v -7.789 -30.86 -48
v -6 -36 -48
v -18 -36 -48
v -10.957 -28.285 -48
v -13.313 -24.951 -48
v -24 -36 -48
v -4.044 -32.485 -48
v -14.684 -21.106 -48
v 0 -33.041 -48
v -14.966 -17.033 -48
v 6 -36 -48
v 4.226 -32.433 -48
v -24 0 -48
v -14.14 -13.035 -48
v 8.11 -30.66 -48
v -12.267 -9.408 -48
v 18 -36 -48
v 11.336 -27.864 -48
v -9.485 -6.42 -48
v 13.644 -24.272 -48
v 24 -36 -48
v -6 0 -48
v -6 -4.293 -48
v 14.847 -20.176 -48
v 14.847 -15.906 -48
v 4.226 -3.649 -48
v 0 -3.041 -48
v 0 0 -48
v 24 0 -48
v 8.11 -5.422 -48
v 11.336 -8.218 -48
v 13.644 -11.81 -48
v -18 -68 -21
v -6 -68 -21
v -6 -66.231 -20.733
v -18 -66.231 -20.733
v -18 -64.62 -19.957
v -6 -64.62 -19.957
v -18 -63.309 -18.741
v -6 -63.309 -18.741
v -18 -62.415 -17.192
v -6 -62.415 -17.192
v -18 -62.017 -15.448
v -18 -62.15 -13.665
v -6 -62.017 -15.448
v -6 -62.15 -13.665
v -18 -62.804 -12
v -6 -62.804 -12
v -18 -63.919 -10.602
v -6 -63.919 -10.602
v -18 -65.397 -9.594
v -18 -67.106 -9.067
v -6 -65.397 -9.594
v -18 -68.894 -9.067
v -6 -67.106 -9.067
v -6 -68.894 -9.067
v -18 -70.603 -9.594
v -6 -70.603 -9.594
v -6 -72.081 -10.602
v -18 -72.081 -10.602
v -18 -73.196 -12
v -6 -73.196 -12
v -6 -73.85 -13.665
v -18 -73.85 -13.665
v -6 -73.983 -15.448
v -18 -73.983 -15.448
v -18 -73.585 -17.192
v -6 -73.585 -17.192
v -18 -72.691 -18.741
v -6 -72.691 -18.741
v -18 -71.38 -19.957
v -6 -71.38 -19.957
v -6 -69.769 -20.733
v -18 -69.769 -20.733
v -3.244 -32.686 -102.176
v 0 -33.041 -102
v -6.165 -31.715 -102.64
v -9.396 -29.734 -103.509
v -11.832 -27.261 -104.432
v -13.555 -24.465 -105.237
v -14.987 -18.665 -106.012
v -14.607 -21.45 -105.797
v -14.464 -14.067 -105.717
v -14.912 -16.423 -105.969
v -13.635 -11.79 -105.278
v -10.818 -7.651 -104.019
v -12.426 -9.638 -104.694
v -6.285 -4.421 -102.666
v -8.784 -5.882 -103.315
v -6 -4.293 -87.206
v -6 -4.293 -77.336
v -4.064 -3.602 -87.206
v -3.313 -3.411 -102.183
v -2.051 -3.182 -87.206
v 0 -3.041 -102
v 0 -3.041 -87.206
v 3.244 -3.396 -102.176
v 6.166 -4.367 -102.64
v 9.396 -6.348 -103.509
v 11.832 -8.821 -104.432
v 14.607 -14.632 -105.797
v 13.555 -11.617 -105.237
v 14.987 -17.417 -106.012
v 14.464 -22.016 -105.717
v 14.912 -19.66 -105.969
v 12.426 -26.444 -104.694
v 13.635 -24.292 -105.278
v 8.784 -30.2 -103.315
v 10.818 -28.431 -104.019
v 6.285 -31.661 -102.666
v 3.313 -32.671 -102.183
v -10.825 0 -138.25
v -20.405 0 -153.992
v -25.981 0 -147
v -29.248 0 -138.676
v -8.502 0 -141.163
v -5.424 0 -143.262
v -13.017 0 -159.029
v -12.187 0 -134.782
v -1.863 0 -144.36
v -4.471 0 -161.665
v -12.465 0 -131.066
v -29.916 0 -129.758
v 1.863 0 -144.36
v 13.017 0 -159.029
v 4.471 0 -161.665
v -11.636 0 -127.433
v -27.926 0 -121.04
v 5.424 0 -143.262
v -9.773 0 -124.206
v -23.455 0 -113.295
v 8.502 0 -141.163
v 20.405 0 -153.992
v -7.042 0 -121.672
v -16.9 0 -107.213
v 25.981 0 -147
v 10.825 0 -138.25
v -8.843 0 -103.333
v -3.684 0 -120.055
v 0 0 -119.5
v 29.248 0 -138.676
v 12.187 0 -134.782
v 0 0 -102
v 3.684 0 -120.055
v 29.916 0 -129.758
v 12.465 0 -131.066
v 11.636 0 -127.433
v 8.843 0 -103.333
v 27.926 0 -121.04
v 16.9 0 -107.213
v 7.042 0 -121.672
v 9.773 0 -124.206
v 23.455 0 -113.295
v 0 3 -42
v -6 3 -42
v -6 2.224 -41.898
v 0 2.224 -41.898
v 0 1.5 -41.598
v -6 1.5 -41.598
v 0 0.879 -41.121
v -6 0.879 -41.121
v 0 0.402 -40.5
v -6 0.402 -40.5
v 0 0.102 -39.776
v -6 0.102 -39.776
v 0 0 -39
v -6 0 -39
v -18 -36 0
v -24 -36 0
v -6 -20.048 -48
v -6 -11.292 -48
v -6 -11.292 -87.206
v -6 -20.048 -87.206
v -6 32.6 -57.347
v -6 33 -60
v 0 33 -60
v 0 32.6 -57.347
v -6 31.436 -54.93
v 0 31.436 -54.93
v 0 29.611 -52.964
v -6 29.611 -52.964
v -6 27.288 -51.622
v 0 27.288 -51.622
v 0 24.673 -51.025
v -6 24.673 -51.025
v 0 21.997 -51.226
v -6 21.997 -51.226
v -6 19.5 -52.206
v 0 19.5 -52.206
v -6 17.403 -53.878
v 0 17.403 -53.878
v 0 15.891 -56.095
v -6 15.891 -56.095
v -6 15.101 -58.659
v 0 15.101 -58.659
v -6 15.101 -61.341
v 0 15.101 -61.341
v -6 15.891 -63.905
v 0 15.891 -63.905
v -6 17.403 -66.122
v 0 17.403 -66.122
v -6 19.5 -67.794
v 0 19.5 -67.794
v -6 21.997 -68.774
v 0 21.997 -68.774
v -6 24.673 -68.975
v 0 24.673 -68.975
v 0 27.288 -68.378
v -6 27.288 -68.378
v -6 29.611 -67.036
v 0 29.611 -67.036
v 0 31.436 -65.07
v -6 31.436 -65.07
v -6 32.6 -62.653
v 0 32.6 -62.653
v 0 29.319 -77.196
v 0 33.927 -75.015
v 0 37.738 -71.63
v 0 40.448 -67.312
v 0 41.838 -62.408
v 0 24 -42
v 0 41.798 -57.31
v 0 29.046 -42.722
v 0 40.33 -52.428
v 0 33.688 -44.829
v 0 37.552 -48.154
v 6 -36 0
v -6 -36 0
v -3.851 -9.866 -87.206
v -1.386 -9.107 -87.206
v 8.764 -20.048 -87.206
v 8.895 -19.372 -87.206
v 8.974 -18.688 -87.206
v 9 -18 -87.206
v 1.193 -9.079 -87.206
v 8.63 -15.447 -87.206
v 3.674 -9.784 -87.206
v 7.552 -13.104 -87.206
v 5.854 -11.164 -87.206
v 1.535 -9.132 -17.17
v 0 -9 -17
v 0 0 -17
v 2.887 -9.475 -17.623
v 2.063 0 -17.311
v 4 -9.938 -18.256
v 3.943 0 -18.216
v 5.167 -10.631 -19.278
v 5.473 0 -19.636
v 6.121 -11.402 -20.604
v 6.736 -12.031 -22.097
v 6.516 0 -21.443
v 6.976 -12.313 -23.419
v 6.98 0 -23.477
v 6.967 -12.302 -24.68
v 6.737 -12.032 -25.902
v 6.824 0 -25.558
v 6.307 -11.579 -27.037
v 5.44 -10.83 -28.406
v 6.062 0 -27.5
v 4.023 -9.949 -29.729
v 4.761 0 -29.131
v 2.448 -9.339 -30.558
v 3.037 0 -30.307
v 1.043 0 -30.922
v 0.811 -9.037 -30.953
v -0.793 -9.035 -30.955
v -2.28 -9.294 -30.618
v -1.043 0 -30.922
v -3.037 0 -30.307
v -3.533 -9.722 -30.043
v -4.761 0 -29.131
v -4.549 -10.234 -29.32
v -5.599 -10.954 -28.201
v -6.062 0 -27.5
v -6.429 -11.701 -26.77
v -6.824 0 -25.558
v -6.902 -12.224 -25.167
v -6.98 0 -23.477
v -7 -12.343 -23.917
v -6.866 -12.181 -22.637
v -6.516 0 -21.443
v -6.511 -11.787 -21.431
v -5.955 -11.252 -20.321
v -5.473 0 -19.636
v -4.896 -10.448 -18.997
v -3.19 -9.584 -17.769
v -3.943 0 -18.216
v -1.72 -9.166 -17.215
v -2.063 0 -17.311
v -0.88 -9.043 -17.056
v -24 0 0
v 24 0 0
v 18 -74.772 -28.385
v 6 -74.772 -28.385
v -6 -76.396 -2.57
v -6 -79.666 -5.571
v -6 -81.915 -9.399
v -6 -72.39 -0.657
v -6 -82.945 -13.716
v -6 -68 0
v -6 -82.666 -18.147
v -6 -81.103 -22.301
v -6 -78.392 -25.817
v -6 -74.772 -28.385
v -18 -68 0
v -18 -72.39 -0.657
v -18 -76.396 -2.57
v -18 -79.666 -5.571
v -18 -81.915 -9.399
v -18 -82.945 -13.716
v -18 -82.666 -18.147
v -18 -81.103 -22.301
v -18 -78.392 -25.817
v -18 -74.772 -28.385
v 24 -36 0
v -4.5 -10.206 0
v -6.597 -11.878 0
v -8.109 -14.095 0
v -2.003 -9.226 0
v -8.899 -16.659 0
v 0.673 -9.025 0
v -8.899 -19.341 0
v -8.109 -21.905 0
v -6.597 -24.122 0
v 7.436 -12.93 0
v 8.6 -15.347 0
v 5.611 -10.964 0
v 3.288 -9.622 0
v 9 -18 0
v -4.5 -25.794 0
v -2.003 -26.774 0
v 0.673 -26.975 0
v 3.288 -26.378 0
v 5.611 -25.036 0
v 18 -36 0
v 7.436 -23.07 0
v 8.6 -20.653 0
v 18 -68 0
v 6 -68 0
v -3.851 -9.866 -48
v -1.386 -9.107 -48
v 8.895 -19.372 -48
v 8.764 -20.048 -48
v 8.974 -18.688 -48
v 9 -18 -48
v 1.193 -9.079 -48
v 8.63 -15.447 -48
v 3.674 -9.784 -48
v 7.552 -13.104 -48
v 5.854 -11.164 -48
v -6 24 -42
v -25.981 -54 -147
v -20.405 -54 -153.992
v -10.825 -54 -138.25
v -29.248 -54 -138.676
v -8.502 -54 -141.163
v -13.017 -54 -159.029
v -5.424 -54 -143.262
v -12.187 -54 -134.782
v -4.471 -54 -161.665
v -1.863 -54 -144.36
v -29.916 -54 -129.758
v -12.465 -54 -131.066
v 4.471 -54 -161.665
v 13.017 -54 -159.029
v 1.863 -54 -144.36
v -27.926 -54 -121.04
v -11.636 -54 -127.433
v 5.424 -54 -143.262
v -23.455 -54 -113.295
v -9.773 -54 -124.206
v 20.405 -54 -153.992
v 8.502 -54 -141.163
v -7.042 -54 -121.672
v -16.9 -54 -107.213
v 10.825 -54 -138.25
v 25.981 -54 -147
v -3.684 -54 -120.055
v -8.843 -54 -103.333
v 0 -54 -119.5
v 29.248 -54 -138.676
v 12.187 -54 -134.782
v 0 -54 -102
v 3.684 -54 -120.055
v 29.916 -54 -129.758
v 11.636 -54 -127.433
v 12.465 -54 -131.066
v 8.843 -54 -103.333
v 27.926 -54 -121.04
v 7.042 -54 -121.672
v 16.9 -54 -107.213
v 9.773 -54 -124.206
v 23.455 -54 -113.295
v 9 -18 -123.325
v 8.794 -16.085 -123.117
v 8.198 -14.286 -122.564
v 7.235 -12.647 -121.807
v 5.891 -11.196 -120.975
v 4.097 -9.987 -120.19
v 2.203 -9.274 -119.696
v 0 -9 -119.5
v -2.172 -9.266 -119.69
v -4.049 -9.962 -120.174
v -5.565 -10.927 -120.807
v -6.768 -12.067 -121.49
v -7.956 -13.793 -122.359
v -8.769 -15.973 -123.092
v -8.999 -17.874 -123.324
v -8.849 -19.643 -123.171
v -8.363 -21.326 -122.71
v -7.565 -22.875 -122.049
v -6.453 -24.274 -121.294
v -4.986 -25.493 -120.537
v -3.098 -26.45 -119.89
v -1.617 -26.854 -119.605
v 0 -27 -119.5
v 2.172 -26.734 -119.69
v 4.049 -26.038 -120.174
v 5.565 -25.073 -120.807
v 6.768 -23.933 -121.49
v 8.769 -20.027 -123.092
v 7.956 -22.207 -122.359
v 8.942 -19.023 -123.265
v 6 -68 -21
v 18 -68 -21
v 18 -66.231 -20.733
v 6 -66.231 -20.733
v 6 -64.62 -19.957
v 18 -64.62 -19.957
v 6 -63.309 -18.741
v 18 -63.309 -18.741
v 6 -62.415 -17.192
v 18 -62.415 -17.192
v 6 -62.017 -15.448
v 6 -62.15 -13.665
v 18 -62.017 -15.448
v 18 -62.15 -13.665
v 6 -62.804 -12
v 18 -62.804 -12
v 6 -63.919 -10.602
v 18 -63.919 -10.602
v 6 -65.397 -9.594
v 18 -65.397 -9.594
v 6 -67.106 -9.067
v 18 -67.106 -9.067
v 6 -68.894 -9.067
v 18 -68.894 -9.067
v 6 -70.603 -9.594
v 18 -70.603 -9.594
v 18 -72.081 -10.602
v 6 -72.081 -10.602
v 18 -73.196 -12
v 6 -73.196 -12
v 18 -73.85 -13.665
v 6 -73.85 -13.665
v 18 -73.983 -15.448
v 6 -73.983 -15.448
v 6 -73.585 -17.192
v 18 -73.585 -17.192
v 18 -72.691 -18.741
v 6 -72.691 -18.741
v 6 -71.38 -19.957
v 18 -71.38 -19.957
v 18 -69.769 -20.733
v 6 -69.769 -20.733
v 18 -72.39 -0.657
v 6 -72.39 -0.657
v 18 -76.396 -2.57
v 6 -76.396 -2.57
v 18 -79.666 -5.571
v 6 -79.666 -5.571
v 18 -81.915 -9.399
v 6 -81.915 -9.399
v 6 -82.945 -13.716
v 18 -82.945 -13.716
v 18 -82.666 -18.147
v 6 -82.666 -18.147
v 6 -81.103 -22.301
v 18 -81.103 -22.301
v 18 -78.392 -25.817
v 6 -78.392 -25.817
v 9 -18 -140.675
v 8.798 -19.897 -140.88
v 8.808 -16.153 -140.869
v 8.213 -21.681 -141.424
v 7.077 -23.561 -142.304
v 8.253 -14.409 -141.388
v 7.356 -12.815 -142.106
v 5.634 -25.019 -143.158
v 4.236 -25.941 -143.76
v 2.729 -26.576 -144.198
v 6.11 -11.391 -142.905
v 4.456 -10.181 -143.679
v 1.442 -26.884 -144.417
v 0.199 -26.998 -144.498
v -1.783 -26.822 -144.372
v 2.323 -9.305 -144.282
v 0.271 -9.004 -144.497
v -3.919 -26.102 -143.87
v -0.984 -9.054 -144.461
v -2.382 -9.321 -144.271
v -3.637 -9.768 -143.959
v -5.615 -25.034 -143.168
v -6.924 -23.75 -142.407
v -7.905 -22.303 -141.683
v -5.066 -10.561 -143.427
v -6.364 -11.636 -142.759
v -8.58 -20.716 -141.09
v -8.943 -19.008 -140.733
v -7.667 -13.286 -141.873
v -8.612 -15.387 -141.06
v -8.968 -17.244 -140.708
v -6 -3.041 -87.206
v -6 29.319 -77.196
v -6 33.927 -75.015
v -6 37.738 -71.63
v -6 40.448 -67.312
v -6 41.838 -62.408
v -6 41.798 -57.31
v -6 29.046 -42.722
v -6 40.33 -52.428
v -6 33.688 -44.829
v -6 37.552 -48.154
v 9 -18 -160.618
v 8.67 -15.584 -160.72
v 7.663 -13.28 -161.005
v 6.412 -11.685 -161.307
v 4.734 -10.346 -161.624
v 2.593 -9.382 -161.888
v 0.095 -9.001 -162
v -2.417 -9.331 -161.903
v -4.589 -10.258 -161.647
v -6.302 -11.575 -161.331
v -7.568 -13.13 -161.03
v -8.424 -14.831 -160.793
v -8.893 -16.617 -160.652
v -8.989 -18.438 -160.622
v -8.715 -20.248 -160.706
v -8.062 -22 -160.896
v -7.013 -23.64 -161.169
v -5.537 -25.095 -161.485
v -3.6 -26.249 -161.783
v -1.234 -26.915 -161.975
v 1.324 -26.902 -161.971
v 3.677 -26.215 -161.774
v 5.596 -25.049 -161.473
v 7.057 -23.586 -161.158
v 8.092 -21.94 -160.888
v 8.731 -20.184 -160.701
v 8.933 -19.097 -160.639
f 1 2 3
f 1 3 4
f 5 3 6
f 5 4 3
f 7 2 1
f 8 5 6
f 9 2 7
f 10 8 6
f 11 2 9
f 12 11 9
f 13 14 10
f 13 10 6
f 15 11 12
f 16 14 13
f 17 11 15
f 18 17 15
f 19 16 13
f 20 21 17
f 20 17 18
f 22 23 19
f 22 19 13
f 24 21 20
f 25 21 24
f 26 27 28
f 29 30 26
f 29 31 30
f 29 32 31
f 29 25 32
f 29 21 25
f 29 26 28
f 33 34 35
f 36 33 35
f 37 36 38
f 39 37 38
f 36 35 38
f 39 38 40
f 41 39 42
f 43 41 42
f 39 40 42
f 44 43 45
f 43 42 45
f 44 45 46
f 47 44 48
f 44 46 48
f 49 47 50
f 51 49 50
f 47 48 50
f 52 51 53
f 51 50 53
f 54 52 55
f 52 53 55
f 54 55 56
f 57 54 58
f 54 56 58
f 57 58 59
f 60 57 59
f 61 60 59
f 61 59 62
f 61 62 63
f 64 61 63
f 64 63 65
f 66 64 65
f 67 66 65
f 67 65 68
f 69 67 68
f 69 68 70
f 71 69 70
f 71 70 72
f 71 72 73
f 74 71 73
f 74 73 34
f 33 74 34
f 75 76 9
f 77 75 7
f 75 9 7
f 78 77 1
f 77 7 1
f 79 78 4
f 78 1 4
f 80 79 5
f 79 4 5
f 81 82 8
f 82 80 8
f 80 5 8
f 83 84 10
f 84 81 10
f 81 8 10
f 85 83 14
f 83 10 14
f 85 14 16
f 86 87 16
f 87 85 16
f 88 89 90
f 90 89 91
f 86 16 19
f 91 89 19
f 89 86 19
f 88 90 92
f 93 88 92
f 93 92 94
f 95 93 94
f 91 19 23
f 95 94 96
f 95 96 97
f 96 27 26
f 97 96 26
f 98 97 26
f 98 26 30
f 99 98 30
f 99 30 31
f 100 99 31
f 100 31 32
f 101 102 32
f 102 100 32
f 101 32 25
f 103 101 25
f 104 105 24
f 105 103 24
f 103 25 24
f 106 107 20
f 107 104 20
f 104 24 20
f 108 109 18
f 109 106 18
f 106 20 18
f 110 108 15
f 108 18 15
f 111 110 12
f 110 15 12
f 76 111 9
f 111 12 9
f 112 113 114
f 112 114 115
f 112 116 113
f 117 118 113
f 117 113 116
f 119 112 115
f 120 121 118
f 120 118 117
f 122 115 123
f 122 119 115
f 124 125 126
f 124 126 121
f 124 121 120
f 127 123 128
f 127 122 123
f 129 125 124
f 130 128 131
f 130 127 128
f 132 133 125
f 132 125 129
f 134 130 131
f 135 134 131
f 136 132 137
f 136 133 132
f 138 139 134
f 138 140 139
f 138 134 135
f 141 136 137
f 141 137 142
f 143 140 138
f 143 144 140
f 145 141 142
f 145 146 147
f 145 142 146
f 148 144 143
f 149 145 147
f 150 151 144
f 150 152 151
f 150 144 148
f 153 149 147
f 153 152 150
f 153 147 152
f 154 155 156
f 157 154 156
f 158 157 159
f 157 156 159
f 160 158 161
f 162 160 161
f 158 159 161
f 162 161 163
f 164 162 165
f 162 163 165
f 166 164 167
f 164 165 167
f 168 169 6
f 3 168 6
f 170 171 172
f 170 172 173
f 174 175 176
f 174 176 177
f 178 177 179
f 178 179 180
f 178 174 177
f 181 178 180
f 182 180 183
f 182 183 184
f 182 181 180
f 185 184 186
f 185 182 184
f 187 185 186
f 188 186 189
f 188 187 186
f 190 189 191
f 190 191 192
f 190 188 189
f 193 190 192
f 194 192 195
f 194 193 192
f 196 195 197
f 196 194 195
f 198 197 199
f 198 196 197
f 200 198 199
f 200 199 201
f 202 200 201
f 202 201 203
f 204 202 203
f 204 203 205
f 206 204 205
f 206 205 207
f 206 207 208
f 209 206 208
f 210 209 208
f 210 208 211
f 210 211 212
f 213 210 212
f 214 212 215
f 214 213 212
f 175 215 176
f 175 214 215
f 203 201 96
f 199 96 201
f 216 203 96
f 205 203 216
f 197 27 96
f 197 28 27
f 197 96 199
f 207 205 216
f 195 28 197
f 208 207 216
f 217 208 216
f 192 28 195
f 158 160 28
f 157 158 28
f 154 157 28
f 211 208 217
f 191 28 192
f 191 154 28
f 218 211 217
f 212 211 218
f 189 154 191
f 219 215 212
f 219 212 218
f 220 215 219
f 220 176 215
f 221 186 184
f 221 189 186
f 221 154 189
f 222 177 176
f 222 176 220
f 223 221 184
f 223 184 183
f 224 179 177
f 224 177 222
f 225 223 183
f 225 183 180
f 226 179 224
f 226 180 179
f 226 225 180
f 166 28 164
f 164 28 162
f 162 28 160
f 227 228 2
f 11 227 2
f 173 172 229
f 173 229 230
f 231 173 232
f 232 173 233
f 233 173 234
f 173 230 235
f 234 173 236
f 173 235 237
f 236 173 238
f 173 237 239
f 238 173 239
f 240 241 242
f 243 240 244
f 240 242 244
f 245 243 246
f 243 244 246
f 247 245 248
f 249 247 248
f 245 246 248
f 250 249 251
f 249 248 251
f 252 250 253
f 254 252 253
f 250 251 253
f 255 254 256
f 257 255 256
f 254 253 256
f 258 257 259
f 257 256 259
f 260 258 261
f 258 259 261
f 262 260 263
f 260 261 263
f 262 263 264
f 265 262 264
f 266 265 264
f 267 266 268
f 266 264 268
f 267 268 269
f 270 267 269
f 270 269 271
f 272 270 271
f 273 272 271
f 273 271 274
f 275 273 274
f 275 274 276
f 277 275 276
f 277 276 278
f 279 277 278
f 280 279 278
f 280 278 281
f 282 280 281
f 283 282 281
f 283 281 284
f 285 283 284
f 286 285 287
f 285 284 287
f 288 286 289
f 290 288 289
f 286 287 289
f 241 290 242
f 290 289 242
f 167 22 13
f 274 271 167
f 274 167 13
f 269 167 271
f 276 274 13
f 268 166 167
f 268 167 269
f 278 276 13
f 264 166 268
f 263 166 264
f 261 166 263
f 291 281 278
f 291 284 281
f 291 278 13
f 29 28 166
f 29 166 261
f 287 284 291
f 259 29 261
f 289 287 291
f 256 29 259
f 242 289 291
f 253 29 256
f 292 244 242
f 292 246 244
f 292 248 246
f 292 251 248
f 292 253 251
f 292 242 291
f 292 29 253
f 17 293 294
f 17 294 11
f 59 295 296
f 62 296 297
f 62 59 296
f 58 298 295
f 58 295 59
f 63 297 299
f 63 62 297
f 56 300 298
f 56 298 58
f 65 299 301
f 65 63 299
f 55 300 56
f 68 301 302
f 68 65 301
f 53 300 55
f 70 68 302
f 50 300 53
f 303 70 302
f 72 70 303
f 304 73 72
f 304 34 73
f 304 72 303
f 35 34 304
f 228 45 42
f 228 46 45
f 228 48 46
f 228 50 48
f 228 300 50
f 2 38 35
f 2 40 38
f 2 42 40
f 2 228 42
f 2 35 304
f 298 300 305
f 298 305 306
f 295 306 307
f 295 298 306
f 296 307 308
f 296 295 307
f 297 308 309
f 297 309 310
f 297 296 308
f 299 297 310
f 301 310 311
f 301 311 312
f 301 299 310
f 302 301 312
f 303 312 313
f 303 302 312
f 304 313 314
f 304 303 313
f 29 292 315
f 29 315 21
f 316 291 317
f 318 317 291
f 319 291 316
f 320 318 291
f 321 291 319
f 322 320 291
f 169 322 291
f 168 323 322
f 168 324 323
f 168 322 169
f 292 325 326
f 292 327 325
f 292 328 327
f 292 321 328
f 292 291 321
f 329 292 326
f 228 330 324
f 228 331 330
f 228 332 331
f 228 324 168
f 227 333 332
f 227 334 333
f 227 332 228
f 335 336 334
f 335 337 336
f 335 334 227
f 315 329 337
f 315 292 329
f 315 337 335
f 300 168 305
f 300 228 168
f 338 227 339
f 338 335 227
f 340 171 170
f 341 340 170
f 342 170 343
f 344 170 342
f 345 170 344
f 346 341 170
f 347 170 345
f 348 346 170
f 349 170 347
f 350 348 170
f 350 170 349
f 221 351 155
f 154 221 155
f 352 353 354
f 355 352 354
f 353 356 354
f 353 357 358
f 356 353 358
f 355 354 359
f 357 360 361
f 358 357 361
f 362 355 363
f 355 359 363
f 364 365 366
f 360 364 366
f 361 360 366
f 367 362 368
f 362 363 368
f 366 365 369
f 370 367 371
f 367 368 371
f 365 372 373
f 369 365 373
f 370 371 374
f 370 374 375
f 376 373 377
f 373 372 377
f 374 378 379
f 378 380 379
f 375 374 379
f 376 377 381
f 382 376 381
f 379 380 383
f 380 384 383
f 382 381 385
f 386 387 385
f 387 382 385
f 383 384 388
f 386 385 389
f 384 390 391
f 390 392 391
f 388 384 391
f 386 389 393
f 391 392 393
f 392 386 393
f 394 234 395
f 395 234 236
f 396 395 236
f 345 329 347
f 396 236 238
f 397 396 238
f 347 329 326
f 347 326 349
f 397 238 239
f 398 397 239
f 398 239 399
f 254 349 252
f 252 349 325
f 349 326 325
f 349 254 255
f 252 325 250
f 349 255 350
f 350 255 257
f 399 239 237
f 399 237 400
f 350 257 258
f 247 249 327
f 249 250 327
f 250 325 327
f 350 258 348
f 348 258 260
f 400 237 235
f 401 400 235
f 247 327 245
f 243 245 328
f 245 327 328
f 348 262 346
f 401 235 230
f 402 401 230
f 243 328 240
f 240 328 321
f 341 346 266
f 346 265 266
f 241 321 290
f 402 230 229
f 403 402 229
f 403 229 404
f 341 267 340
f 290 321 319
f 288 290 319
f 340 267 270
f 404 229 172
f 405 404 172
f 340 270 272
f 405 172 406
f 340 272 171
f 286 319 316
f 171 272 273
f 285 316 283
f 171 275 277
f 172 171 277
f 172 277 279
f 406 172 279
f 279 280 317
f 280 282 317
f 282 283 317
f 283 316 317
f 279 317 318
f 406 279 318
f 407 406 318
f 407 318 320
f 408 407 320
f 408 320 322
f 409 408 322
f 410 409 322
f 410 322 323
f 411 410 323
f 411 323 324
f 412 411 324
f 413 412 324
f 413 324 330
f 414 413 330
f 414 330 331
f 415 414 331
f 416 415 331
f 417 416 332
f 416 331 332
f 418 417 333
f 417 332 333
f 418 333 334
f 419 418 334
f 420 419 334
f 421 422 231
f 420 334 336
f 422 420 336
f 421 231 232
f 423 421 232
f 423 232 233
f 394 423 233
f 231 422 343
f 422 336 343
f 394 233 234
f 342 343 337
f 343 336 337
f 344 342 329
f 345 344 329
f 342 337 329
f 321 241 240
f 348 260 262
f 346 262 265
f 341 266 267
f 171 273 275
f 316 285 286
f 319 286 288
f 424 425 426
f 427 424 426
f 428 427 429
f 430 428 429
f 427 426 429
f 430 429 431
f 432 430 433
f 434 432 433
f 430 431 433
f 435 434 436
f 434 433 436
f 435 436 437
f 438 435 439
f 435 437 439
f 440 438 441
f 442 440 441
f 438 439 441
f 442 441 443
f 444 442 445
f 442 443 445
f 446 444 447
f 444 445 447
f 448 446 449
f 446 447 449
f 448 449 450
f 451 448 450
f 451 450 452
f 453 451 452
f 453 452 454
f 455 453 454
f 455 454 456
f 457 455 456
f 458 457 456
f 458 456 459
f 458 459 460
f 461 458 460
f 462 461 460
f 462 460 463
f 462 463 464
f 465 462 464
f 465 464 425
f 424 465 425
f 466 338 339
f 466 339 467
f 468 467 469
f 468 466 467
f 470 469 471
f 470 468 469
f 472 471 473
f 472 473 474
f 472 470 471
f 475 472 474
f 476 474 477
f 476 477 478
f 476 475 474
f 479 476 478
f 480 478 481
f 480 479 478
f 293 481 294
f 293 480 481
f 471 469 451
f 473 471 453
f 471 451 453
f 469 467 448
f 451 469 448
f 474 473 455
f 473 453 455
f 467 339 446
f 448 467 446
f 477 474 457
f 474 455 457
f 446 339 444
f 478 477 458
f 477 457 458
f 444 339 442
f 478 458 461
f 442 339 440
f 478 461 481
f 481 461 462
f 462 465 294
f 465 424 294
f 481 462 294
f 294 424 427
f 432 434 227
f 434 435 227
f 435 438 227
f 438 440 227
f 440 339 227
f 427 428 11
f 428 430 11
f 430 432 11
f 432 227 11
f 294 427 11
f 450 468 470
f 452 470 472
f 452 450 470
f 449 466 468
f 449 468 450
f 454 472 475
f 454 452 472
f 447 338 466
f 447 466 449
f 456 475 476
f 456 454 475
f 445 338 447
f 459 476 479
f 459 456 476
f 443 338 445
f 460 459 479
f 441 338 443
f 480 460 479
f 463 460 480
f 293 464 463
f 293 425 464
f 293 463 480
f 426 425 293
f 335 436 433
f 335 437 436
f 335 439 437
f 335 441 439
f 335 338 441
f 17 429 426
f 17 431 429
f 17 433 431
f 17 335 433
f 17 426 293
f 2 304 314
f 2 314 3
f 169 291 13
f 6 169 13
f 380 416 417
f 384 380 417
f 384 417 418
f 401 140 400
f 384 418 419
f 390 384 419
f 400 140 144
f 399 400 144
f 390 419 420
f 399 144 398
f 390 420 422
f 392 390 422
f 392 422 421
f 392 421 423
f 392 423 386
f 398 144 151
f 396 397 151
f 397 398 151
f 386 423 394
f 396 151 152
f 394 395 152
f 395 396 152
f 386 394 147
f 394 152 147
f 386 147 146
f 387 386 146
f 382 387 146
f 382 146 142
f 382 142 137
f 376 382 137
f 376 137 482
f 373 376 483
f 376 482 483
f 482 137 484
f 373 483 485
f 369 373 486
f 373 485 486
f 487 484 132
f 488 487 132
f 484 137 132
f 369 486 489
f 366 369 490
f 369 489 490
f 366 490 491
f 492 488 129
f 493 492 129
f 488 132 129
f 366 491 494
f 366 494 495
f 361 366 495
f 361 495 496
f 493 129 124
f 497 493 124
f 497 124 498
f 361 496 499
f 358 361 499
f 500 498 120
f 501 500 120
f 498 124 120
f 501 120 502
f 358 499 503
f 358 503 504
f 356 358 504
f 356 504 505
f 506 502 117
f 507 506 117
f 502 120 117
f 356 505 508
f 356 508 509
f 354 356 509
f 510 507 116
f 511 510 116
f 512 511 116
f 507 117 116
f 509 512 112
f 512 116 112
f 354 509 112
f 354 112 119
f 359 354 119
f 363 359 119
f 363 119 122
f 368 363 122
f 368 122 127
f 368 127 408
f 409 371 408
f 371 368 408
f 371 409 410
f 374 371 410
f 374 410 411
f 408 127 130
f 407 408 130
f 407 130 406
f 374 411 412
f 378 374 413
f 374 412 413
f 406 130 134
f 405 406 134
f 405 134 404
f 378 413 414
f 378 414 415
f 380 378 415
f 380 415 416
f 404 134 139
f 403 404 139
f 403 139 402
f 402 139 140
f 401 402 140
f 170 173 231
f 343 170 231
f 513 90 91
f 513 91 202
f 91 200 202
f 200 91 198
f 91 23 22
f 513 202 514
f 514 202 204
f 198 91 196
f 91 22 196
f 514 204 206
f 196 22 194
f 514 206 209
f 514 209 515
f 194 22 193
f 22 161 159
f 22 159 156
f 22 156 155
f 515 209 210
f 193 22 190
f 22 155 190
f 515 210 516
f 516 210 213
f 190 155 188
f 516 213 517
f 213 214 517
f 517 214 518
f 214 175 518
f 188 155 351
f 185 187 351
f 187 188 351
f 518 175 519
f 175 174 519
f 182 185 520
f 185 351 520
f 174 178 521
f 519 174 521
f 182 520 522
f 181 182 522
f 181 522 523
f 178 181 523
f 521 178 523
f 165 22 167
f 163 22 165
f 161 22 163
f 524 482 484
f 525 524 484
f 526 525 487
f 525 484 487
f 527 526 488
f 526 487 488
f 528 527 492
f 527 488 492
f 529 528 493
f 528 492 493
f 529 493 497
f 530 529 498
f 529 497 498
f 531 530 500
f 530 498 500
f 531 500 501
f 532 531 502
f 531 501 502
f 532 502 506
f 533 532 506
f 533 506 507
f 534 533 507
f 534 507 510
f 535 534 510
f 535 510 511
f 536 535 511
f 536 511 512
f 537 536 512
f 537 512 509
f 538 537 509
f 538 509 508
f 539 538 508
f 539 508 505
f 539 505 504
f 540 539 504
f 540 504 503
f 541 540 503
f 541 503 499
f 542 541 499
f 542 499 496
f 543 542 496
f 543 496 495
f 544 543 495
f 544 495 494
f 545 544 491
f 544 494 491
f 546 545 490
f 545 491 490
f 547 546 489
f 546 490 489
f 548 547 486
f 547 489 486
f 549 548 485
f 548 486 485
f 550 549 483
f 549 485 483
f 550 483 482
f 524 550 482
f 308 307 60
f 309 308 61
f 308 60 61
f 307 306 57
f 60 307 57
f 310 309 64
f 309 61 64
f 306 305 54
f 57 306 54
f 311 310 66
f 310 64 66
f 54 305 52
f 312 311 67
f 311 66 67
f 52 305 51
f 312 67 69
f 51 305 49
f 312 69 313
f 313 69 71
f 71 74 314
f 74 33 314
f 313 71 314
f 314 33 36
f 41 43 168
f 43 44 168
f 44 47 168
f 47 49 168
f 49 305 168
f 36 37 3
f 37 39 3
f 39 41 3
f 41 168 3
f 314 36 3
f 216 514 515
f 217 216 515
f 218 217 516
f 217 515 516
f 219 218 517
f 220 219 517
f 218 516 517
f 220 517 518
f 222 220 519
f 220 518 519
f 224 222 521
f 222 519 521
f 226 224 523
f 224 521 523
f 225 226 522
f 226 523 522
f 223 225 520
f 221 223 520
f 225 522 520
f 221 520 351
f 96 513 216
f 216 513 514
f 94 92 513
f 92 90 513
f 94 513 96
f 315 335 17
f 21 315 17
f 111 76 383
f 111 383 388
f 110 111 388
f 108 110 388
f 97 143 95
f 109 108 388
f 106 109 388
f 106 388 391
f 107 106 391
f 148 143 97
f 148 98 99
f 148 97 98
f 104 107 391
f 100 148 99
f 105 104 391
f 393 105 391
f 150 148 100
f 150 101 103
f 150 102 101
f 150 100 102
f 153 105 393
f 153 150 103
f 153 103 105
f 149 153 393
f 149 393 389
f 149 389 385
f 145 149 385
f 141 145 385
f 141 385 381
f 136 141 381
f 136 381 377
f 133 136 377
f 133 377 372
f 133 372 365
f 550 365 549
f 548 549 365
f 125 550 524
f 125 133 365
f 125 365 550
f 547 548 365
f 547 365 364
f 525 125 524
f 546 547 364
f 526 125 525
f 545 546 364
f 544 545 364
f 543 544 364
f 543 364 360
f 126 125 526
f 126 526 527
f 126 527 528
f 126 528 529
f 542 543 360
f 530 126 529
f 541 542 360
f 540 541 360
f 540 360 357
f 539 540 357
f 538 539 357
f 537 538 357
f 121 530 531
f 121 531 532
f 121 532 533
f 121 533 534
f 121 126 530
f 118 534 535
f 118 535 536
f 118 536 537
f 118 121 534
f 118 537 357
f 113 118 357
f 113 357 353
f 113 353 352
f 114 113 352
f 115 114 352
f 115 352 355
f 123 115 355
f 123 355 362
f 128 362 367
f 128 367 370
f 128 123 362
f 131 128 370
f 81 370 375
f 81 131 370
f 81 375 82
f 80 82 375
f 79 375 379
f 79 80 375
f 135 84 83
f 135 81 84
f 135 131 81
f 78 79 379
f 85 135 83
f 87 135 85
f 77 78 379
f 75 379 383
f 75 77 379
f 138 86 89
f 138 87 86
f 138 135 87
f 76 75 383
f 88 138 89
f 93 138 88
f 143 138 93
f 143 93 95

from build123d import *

# Parameters (mm, degrees)
BOSS_EXTRUDE1_DEPTH       = 24
BOSS_EXTRUDE1_DEPTH_BACK  = 24
SKETCH1_W                 = 48
SKETCH1_H                 = 36
BOSS_EXTRUDE2_DEPTH       = 12
BOSS_EXTRUDE3_START       = -12
BOSS_EXTRUDE3_DEPTH       = 12
SKETCH7_R                 = 6
CUT_EXTRUDE1_DEPTH        = 105.675689632
SKETCH9_R                 = 30
SKETCH9_R_2               = 12.5
BOSS_EXTRUDE4_DEPTH       = 54
BOSS_EXTRUDE5_REACH       = 146.17
BOSS_EXTRUDE5_END_RADIUS  = 30
SKETCH10_R                = 15
SKETCH11_R                = 9
CUT_EXTRUDE2_DEPTH        = 185.480351361
BOSS_EXTRUDE6_START       = -87.205977382
BOSS_EXTRUDE6_DEPTH       = 39.205977382
BOSS_EXTRUDE6_START_2     = -77.335756752
BOSS_EXTRUDE6_2_DEPTH     = 29.335756752
BOSS_EXTRUDE6_START_3     = -6
BOSS_EXTRUDE6_3_OUTLINE_R = 9
BOSS_EXTRUDE6_3_DEPTH     = 6
CUT_EXTRUDE3_REACH        = 186.48
CUT_EXTRUDE3_END_RADIUS   = 9
SKETCH13_R                = 7


with BuildPart() as part:
    # Sketch1 → Boss-Extrude1 (new, two sides: drawn at the far end of the back side and taken through both)
    with BuildSketch(Plane(origin=(0, 0, 0), x_dir=(0, 0, -1), z_dir=(1, 0, 0)).offset(-BOSS_EXTRUDE1_DEPTH_BACK)):
        with Locations((24, -18)):
            Rectangle(SKETCH1_W, SKETCH1_H)
    extrude(amount=BOSS_EXTRUDE1_DEPTH + BOSS_EXTRUDE1_DEPTH_BACK)

    # Sketch2 → Boss-Extrude2 (add)
    with BuildSketch(Plane(origin=(18, 0, 0), x_dir=(0, 0, -1), z_dir=(1, 0, 0))):
        with BuildLine():
            Line((0, -36), (0, -68))
            ThreePointArc((0, -68), (11.519205494, -82.590547269), (28.384542614, -74.771559571))
            Line((28.384542614, -74.771559571), (48, -36))
            Line((48, -36), (0, -36))
        make_face()
    extrude(amount=-BOSS_EXTRUDE2_DEPTH)

    # Sketch6 → Boss-Extrude3 (add)
    with BuildSketch(Plane.ZY.offset(18).offset(BOSS_EXTRUDE3_START)):
        with BuildLine():
            Line((0, -36), (0, -68))
            ThreePointArc((0, -68), (-11.519205494, -82.590547269), (-28.384542614, -74.771559571))
            Line((-28.384542614, -74.771559571), (-48, -36))
            Line((-48, -36), (-48, 0))
            Line((-48, 0), (0, 0))
            Line((0, 0), (0, -36))
        make_face()
    extrude(amount=BOSS_EXTRUDE3_DEPTH)

    # Sketch7 → Cut-Extrude1 (cut, through all)
    with BuildSketch(Plane(origin=(18, 0, 0), x_dir=(0, 0, -1), z_dir=(1, 0, 0))):
        with Locations((15, -68)):
            Circle(SKETCH7_R)
    extrude(amount=-CUT_EXTRUDE1_DEPTH, mode=Mode.SUBTRACT)



with BuildPart() as body_2:
    # Sketch9 → Boss-Extrude4 (new body)
    with BuildSketch(Plane(origin=(0, 0, 0), x_dir=(1, 0, 0), z_dir=(0, 1, 0))):
        with Locations(Location((0, 132, 0), (0, 0, 270))):
            Circle(SKETCH9_R)
        with Locations(Location((0, 132, 0), (0, 0, 270))):
            Circle(SKETCH9_R_2, mode=Mode.SUBTRACT)
    extrude(amount=-BOSS_EXTRUDE4_DEPTH)


with BuildPart() as part_1:
    add(part.part)

    add(body_2.part)  # Boss-Extrude5 merges body 2
    # Boss-Extrude5: up to this cylinder (the profile starts outside it)
    boss_extrude5_end = Plane(origin=(0, -18.040976, -132), z_dir=(0, 1, 0)) * Cylinder(BOSS_EXTRUDE5_END_RADIUS, 353.34, mode=Mode.PRIVATE)
    # Sketch10 → Boss-Extrude5 (add, up to the surface)
    with BuildSketch(Plane(origin=(0, 0, -48), x_dir=(-1, 0, 0), z_dir=(0, 0, -1)), mode=Mode.PRIVATE) as boss_extrude5_sk1:
        with Locations(Location((0, -18.040976412, 0), (0, 0, 270))):
            Circle(SKETCH10_R)
    boss_extrude5_tool1 = extrude(boss_extrude5_sk1.sketch, amount=BOSS_EXTRUDE5_REACH, mode=Mode.PRIVATE) - boss_extrude5_end
    add(boss_extrude5_tool1.solids().sort_by_distance((0, -18.040976, -48))[0])

    # Sketch11 → Cut-Extrude2 (cut, through all)
    with BuildSketch(Plane.XY):
        with Locations((0, -18)):
            Circle(SKETCH11_R)
    extrude(amount=-CUT_EXTRUDE2_DEPTH, mode=Mode.SUBTRACT)

    # Boss-Extrude6: read off the stored shape, not the designer's step
    # Boss-Extrude6 outline → Boss-Extrude6 (add)
    with BuildSketch(Plane.XY.offset(BOSS_EXTRUDE6_START)):
        with BuildLine():
            ThreePointArc((8.763833852, -20.048222698), (4.591126901, -10.259098646), (-6, -11.291796068))
            Line((-6, -11.291796068), (-6, -20.048222698))
            Line((-6, -20.048222698), (8.763833852, -20.048222698))
        make_face()
    extrude(amount=BOSS_EXTRUDE6_DEPTH)

    # Boss-Extrude6 2 outline → Boss-Extrude6 2 (add)
    with BuildSketch(Plane.XY.offset(BOSS_EXTRUDE6_START_2)):
        with BuildLine():
            Line((0, 0), (-6, 0))
            Line((-6, 0), (-6, -4.293249327))
            ThreePointArc((-6, -4.293249327), (-3.064644655, -3.357381718), (0, -3.040976412))
            Line((0, -3.040976412), (0, 0))
        make_face()
    extrude(amount=BOSS_EXTRUDE6_2_DEPTH)

    # Boss-Extrude6 3 outline → Boss-Extrude6 3 (add)
    with BuildSketch(Plane.YZ.offset(BOSS_EXTRUDE6_START_3)):
        with BuildLine():
            Line((-6, -87.205977382), (-3.040976412, -87.205977382))
            Line((-3.040976412, -87.205977382), (29.319215471, -77.196102662))
            ThreePointArc((29.319215471, -77.196102662), (41.797890998, -57.310190334), (24, -42))
            Line((24, -42), (3, -42))
            ThreePointArc((3, -42), (0.878679656, -41.121320344), (0, -39))
            Line((0, -39), (0, -77.335756752))
            Line((0, -77.335756752), (-6, -77.335756752))
            Line((-6, -77.335756752), (-6, -87.205977382))
        make_face()
        with Locations((24, -60)):
            Circle(BOSS_EXTRUDE6_3_OUTLINE_R, mode=Mode.SUBTRACT)
    extrude(amount=BOSS_EXTRUDE6_3_DEPTH)

    # Cut-Extrude3: up to this cylinder (the profile starts outside it)
    cut_extrude3_end = Plane(origin=(0, -18, -24), z_dir=(0, 0, 1)) * Cylinder(CUT_EXTRUDE3_END_RADIUS, 391.96, mode=Mode.PRIVATE)
    # Sketch13 → Cut-Extrude3 (cut, up to the surface)
    with BuildSketch(Plane(origin=(0, 0, 0), x_dir=(1, 0, 0), z_dir=(0, 1, 0)), mode=Mode.PRIVATE) as cut_extrude3_sk1:
        with Locations(Location((0, 24, 0), (0, 0, 270))):
            Circle(SKETCH13_R)
    cut_extrude3_tool1 = extrude(cut_extrude3_sk1.sketch, amount=-CUT_EXTRUDE3_REACH, mode=Mode.PRIVATE) - cut_extrude3_end
    add(cut_extrude3_tool1.solids().sort_by_distance((0, 0, -24))[0], mode=Mode.SUBTRACT)


solid = part_1.part
